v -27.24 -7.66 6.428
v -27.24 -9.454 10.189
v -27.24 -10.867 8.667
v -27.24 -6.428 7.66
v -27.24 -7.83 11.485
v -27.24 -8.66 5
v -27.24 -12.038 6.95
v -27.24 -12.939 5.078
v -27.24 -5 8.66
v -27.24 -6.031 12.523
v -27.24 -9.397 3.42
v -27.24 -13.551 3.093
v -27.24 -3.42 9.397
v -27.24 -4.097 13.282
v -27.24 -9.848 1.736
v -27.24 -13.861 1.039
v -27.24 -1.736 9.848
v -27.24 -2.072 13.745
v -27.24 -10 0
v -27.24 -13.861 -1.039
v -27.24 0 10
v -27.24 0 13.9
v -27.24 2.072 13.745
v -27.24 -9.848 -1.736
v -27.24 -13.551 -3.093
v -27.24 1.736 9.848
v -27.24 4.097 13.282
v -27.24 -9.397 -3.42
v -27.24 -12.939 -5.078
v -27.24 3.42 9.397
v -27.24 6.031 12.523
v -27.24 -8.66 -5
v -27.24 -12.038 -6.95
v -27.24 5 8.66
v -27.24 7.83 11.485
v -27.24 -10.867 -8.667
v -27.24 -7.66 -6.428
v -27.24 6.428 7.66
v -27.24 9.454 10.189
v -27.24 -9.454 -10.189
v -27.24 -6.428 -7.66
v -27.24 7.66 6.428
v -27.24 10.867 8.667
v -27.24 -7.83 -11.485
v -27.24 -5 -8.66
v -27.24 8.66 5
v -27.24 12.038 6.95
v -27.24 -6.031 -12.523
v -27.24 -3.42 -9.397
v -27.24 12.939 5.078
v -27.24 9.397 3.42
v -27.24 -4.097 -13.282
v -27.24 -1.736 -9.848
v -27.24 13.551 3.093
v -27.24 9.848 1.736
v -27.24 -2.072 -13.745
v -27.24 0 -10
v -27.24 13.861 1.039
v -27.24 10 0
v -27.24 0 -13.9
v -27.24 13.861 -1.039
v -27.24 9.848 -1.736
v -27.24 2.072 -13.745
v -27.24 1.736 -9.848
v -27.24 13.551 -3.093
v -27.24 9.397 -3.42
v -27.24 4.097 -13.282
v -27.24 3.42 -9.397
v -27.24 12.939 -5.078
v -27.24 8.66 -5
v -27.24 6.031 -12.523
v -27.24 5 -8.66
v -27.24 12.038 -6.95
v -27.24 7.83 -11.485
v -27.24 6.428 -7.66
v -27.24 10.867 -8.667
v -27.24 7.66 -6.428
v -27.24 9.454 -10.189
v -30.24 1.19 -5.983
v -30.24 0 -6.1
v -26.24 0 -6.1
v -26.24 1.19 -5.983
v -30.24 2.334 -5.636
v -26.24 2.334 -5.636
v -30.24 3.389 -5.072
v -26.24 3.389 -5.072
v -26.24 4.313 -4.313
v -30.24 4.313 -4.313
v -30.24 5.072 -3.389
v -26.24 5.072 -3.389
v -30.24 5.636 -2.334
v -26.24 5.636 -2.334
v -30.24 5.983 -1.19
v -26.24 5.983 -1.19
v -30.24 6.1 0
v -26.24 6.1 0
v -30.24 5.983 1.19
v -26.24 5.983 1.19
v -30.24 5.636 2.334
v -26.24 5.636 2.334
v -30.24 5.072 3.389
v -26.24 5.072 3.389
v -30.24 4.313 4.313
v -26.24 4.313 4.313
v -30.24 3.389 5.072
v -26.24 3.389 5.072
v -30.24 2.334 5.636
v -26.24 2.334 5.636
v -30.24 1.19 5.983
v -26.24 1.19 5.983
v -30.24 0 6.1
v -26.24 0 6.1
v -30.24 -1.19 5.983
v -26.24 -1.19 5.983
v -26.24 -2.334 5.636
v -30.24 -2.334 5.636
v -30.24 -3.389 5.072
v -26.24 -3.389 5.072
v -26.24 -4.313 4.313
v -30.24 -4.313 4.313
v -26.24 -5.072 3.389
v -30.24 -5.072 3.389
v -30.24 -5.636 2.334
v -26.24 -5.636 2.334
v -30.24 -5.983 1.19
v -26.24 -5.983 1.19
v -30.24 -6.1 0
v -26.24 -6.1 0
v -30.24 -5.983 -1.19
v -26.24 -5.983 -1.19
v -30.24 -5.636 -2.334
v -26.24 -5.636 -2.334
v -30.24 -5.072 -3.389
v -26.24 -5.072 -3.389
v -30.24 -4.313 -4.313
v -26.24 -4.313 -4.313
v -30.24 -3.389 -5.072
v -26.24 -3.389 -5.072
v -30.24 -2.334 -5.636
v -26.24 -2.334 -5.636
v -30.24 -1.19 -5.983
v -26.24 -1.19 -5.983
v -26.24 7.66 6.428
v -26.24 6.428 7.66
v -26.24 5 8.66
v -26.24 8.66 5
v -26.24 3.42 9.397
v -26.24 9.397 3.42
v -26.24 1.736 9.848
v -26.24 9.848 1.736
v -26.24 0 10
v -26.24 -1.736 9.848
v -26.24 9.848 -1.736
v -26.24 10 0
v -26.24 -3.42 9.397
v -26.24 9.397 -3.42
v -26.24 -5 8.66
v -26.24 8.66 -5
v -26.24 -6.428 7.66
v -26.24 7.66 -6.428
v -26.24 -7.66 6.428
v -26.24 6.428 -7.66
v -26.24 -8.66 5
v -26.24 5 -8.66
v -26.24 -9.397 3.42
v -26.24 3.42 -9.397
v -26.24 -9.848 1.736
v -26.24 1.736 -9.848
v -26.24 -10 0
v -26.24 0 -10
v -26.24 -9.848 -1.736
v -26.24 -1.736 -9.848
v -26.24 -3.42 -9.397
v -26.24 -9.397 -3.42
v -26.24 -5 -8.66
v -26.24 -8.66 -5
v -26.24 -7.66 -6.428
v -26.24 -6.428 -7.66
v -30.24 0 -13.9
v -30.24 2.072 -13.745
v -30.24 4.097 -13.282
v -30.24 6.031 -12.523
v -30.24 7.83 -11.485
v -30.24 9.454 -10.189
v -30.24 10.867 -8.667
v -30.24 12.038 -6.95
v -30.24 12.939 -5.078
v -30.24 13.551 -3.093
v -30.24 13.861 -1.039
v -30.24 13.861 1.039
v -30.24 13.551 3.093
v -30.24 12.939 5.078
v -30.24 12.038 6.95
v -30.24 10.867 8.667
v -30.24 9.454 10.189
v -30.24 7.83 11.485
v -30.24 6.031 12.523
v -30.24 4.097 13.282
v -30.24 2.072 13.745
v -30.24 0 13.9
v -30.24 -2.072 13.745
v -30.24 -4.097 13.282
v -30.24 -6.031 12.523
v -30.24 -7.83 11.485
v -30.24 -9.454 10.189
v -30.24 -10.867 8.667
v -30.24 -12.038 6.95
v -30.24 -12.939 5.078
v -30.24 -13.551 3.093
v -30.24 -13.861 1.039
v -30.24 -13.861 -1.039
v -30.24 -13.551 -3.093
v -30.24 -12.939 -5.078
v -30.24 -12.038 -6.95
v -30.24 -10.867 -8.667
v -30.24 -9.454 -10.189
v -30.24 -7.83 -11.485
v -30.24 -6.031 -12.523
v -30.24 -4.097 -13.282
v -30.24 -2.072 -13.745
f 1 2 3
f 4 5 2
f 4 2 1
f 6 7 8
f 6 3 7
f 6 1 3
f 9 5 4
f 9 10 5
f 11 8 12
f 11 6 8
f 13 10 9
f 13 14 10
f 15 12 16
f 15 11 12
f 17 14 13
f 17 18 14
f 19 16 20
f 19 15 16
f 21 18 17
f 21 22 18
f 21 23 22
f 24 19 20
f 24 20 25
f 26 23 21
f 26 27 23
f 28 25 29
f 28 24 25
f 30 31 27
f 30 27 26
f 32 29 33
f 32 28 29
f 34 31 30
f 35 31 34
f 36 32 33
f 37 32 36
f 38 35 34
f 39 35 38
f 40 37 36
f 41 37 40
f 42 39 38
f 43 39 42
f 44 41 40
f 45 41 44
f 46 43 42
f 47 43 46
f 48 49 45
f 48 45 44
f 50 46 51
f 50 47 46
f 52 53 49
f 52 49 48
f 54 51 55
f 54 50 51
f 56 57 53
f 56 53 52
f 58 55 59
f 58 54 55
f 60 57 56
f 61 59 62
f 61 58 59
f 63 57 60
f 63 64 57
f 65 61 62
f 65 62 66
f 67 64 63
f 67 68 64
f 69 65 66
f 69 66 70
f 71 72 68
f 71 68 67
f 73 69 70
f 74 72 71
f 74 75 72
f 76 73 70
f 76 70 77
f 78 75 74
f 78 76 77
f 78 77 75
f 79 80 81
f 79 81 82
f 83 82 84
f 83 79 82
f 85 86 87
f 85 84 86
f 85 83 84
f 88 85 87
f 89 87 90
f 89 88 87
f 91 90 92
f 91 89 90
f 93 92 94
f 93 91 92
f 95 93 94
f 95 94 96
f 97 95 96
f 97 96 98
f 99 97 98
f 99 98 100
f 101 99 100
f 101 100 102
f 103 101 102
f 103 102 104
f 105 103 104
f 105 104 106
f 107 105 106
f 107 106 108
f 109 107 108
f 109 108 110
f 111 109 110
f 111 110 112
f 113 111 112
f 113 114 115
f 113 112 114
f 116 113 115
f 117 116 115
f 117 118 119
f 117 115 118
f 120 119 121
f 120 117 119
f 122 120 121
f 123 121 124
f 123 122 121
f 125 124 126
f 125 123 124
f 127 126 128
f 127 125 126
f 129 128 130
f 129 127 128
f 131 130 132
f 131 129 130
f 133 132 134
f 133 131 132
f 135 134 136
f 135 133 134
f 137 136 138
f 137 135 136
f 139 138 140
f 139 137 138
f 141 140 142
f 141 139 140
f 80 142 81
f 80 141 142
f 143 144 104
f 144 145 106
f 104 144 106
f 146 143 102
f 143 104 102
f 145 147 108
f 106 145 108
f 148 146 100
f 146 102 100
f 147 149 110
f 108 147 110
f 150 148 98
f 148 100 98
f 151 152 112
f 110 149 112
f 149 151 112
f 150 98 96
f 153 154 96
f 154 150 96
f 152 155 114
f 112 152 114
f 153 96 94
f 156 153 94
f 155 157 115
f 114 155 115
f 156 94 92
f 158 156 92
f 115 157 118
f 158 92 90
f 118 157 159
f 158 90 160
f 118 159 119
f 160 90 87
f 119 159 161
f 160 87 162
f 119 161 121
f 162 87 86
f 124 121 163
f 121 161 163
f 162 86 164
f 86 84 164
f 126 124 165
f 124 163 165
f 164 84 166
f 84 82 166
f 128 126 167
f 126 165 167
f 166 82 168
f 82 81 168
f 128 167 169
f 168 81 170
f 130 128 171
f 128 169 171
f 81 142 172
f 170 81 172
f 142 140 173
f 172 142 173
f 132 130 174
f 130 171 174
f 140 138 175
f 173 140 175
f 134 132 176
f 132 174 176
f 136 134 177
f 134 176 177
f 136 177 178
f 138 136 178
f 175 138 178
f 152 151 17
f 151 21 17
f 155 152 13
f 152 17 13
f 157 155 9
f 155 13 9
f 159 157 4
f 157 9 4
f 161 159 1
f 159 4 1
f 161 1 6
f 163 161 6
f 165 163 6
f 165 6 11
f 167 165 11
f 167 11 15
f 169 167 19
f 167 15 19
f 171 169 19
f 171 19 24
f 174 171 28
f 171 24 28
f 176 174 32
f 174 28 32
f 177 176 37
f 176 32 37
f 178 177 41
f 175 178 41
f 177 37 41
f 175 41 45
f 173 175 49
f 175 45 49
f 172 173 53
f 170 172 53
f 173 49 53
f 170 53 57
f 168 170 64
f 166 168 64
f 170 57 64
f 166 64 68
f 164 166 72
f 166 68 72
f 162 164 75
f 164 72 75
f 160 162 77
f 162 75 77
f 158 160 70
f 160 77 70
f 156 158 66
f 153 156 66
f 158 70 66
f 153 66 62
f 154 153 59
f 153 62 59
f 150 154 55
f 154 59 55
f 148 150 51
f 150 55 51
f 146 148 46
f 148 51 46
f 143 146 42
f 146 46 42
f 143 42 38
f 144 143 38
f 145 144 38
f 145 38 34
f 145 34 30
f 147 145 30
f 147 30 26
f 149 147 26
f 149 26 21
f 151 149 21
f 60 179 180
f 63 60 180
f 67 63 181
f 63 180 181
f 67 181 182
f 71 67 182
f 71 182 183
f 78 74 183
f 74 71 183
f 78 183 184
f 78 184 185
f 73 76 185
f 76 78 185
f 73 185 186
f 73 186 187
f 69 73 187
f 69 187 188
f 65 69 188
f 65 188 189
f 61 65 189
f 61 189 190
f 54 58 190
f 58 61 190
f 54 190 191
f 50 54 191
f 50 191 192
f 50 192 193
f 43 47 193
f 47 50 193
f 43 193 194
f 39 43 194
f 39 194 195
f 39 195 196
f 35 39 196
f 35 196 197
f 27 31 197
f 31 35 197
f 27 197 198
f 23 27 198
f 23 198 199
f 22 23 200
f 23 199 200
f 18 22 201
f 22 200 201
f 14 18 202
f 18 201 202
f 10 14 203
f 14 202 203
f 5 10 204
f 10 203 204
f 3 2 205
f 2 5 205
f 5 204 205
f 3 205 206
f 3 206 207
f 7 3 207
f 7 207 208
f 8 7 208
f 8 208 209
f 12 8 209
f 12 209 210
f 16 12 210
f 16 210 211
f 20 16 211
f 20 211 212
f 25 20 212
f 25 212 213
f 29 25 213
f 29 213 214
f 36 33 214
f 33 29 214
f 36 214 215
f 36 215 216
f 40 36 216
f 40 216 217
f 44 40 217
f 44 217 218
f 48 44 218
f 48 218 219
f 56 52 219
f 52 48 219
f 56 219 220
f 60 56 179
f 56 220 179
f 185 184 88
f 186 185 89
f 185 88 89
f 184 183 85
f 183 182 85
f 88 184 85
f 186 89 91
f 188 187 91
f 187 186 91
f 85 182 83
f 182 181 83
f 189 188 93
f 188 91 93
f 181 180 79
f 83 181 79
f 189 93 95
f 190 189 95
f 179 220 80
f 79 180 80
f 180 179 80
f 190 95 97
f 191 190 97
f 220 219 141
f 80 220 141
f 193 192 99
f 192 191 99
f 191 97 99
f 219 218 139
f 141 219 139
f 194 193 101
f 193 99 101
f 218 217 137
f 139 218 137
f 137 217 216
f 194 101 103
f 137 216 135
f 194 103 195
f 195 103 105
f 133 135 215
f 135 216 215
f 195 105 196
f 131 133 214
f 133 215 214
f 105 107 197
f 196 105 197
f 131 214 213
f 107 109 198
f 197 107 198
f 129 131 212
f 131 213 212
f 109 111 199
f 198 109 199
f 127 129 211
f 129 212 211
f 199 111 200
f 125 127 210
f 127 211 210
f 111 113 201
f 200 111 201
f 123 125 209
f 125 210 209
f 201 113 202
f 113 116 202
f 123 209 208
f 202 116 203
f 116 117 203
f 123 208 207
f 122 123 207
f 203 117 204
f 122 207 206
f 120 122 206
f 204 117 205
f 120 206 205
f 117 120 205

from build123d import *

# Parameters (mm, degrees)
FORMSENKUNG_F_R_M3_SENKSCHRAUBE_MIT_INNE_D           = 3.4
FORMSENKUNG_F_R_M3_SENKSCHRAUBE_MIT_INNE_CSINK_D     = 5.7
FORMSENKUNG_F_R_M3_SENKSCHRAUBE_MIT_INNE_CSINK_ANGLE = 90
KREISMUSTER1_COUNT                                   = 4
SKIZZE5_R                                            = 24.563351151
SKIZZE5_R_2                                          = 12.292484408
SCHNITT_LINEAR_AUSTRAGEN3_DEPTH                      = 32.128764833
SCHNITT_LINEAR_AUSTRAGEN5_DEPTH                      = 29.565713714
SCHNITT_LINEAR_AUSTRAGEN5_DEPTH_BACK                 = 29.565713714
SKIZZE12_R                                           = 25.145284477
SKIZZE12_R_2                                         = 13.9
SCHNITT_LINEAR_AUSTRAGEN6_DEPTH                      = 21.06040877
SCHNITT_LINEAR_AUSTRAGEN6_DEPTH_BACK                 = 21.06040877
SKIZZE13_R                                           = 6.1


with BuildPart() as part:
    # Skizze1 → Rotation1 (revolve)
    with BuildSketch(Plane.XY):
        Polygon((-30.239658347, 20), (-30.239658347, 6), (-26.239658347, 6), (-26.239658347, 10), (-27.239658347, 10), (-27.239658347, 14), (-14.239658347, 14), (-14.239658347, 20), align=None)
    revolve(axis=Axis((-37.668433178, 0, 0), (1, 0, 0)))

    # Formsenkung für M3 Senkschraube mit Innensechskant1 (through all)
    with Locations(Plane(origin=(-14.239658347, 0, 0), x_dir=(0, 0, -1), z_dir=(1, 0, 0))):
        with Locations((0, 17)):
            formsenkung_f_r_m3_senkschraube_mit_inne = CounterSinkHole(FORMSENKUNG_F_R_M3_SENKSCHRAUBE_MIT_INNE_D / 2, FORMSENKUNG_F_R_M3_SENKSCHRAUBE_MIT_INNE_CSINK_D / 2, counter_sink_angle=FORMSENKUNG_F_R_M3_SENKSCHRAUBE_MIT_INNE_CSINK_ANGLE)

    # Kreismuster1: Formsenkung für M3 Senkschraube mit Innensechskant1 ×4 about axis
    kreismuster1_axis = Axis((-14.239658347, 0, 0), (-1, 0, 0))
    for i in range(1, KREISMUSTER1_COUNT):
        add(formsenkung_f_r_m3_senkschraube_mit_inne.rotate(kreismuster1_axis, i * 360 / KREISMUSTER1_COUNT), mode=Mode.SUBTRACT)

    # Skizze5 → Schnitt-Linear austragen3 (cut, through all)
    with BuildSketch(Plane(origin=(-27.239658347, 0, 0), x_dir=(0, 0, -1), z_dir=(1, 0, 0))):
        Circle(SKIZZE5_R)
        Circle(SKIZZE5_R_2, mode=Mode.SUBTRACT)
    extrude(amount=SCHNITT_LINEAR_AUSTRAGEN3_DEPTH, mode=Mode.SUBTRACT)

    # Skizze12 → Schnitt-Linear austragen5 (cut, two sides: drawn at the far end of the back side and taken through both)
    with BuildSketch(Plane(origin=(-26.239658347, 0, 0), x_dir=(0, 0, -1), z_dir=(1, 0, 0)).offset(-SCHNITT_LINEAR_AUSTRAGEN5_DEPTH_BACK)):
        Circle(SKIZZE12_R)
        Circle(SKIZZE12_R_2, mode=Mode.SUBTRACT)
    extrude(amount=SCHNITT_LINEAR_AUSTRAGEN5_DEPTH + SCHNITT_LINEAR_AUSTRAGEN5_DEPTH_BACK, mode=Mode.SUBTRACT)

    # Skizze13 → Schnitt-Linear austragen6 (cut, two sides: drawn at the far end of the back side and taken through both)
    with BuildSketch(Plane(origin=(-26.239658347, 0, 0), x_dir=(0, 0, -1), z_dir=(1, 0, 0)).offset(-SCHNITT_LINEAR_AUSTRAGEN6_DEPTH_BACK)):
        Circle(SKIZZE13_R)
    extrude(amount=SCHNITT_LINEAR_AUSTRAGEN6_DEPTH + SCHNITT_LINEAR_AUSTRAGEN6_DEPTH_BACK, mode=Mode.SUBTRACT)


solid = part.part
